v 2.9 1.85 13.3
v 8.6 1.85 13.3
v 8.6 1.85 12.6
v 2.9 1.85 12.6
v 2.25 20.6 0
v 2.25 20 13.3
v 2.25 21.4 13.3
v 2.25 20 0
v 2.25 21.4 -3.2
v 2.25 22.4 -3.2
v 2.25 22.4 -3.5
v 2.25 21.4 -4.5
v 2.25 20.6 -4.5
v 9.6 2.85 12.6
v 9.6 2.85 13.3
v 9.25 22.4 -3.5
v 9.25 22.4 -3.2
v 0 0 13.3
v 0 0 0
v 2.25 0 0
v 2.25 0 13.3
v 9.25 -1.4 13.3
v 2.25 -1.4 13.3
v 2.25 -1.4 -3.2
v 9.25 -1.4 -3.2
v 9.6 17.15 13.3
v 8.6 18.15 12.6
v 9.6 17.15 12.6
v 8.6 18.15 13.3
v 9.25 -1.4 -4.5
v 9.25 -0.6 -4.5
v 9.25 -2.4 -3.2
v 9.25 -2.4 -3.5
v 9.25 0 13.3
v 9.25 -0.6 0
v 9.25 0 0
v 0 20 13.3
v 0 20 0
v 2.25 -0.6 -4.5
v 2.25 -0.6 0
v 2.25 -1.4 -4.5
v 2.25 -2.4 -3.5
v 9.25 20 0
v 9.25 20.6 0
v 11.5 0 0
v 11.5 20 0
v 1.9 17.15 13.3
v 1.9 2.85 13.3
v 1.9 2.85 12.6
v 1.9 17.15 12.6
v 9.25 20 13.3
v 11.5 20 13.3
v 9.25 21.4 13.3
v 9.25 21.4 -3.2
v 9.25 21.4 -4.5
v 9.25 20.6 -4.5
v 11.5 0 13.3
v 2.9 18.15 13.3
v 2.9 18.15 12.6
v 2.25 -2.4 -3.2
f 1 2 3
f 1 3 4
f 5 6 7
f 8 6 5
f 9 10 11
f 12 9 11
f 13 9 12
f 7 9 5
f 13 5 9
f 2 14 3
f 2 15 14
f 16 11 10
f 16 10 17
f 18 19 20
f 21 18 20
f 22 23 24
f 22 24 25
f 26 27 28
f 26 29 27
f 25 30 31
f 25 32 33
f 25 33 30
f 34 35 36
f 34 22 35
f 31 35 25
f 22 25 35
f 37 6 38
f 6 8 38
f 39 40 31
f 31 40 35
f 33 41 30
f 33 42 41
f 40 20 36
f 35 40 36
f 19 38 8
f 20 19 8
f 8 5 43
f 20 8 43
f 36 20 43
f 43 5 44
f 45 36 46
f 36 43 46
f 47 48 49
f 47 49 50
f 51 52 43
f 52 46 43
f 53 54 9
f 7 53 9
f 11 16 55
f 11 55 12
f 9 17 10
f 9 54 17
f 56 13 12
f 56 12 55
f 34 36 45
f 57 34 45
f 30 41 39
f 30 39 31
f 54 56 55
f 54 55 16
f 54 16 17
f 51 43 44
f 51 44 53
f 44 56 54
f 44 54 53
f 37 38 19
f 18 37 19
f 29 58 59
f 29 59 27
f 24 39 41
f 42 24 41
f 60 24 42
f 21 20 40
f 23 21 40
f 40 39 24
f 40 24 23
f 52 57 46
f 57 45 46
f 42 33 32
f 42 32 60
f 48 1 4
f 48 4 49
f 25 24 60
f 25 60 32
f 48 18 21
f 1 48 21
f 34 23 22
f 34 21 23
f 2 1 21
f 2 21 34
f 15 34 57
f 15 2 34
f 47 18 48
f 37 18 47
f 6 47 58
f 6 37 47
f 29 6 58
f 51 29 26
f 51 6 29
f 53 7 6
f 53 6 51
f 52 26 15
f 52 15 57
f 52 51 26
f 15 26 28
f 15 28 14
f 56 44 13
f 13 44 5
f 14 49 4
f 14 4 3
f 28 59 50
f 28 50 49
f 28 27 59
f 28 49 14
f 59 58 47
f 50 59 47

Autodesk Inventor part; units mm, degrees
ref_plane "YZ Plane" through (0, 0, 0) normal (1, 0, 0) x (0, 1, 0)
ref_plane "XZ Plane" through (0, 0, 0) normal (0, 1, 0) x (-1, 0, 0)
sketch "Skizze1" plane through (0, 0, 0) normal (0, 0, 1) x (1, 0, 0)
  line L0 (0, 0) -> (11.5, 0)
  line L1 (11.5, 0) -> (11.5, 20)
  line L2 (11.5, 20) -> (0, 20)
  line L3 (0, 20) -> (0, 0)
  line L4 (2.25, 20) -> (9.25, 20)
  line L5 (9.25, 20) -> (9.25, 21.4)
  line L6 (9.25, 21.4) -> (2.25, 21.4)
  line L7 (2.25, 21.4) -> (2.25, 20)
  line L8 (2.2583, 0) -> (10.4927, 0)
  line L9 (9.25, 0) -> (2.25, 0)
  line L10 (2.25, 0) -> (2.25, -1.4)
  line L11 (2.25, -1.4) -> (9.25, -1.4)
  line L12 (9.25, -1.4) -> (9.25, 0)
  dimension "d0" = 11.5
  dimension "d1" = 20
  dimension "d4" = 7
  dimension "d5" = 1.4
  dimension "d6" = 2.25
  dimension "d7" = 2.25
extrude "Extrusion1" add sketch "Skizze1" along normal blind 13.3
ref_plane "Arbeitsebene2" through (2.25, 10, 0) normal (0, 1, 0) x (1, 0, 0)
sketch "Skizze2" plane through (0, 0, 13.3) normal (0, 0, 1) x (1, 0, 0)
  line L0 (9.25, 21.4) -> (2.25, 21.4) projected
  line L1 (0, 20) -> (0, 0) projected
  line L2 (2.25, -1.4) -> (9.25, -1.4) projected
  line L3 (11.5, 0) -> (11.5, 20) projected
  line L4 (2.9, 18.15) -> (8.6, 18.15)
  line L5 (9.6, 17.15) -> (9.6, 2.85)
  line L6 (8.6, 1.85) -> (2.9, 1.85)
  line L7 (1.9, 2.85) -> (1.9, 17.15)
  line L8 (2.9, 18.15) -> (1.9, 17.15)
  line L9 (8.6, 18.15) -> (9.6, 17.15)
  line L10 (9.6, 2.85) -> (8.6, 1.85)
  line L11 (2.9, 1.85) -> (1.9, 2.85)
  point P0 (1.9, 18.15)
  point P1 (9.6, 1.85)
  point P2 (9.6, 18.15)
  point P3 (1.9, 1.85)
  dimension "d8" = 1.9
  dimension "d9" = 1.9
  dimension "d10" = 3.25
  dimension "d11" = 3.25
  dimension "d12" = 1
  dimension "d13" = 1
  dimension "d14" = 1
  dimension "d15" = 1
  dimension "d16" = 1
  dimension "d17" = 1
  dimension "d18" = 1
  dimension "d19" = 1
extrude "Extrusion2" cut sketch "Skizze2" against normal blind 0.7
sketch "Skizze4" plane through (0, 0, 0) normal (0, 0, -1) x (-1, 0, 0)
  line L0 (-2.25, 21.4) -> (-2.25, 20) projected
  line L1 (-9.25, 21.4) -> (-2.25, 21.4) projected
  line L2 (-9.25, 20) -> (-9.25, 21.4) projected
  line L3 (-9.25, -1.4) -> (-9.25, 0) projected
  line L4 (-2.25, -1.4) -> (-9.25, -1.4) projected
  line L5 (-2.25, 0) -> (-2.25, -1.4) projected
  line L6 (-9.25, 20.6) -> (-2.25, 20.6)
  dimension "d32" = 0.8
extrude "Extrusion3" add sketch "Skizze4" along normal blind 4.5
sketch "Skizze5" plane through (2.25, 21.4, 13.3) normal (0, 1, 0) x (1, 0, 0)
  line L0 (7, 17.8) -> (7, 0) projected
  line L1 (0, 17.8) -> (7, 17.8) projected
  line L2 (0, 17.8) -> (7, 17.8)
  line L3 (7, 17.8) -> (7, 16.5)
  line L4 (7, 16.5) -> (0, 16.5)
  line L5 (0, 16.5) -> (0, 17.8)
  point P0 (-2.25, 13.3)
  dimension "d36" = 1.3
extrude "Extrusion4" add sketch "Skizze5" along normal blind 1
chamfer "Fase1" distance 1 angle 45 1 edges at (5.75, 22.4, -4.5)
mirror "Spiegeln1" about plane through (2.25, 10, 0) normal (0, 1, 0) of "Extrusion4", "Fase1", "Extrusion3"
equation "\"d13\" = d12"
equation "\"d14\" = d12"
equation "\"d15\" = d14"
equation "\"d16\" = d12"
equation "\"d17\" = d16"
equation "\"d18\" = d12"
equation "\"d19\" = d18"
properties part number "motor_shaft"
